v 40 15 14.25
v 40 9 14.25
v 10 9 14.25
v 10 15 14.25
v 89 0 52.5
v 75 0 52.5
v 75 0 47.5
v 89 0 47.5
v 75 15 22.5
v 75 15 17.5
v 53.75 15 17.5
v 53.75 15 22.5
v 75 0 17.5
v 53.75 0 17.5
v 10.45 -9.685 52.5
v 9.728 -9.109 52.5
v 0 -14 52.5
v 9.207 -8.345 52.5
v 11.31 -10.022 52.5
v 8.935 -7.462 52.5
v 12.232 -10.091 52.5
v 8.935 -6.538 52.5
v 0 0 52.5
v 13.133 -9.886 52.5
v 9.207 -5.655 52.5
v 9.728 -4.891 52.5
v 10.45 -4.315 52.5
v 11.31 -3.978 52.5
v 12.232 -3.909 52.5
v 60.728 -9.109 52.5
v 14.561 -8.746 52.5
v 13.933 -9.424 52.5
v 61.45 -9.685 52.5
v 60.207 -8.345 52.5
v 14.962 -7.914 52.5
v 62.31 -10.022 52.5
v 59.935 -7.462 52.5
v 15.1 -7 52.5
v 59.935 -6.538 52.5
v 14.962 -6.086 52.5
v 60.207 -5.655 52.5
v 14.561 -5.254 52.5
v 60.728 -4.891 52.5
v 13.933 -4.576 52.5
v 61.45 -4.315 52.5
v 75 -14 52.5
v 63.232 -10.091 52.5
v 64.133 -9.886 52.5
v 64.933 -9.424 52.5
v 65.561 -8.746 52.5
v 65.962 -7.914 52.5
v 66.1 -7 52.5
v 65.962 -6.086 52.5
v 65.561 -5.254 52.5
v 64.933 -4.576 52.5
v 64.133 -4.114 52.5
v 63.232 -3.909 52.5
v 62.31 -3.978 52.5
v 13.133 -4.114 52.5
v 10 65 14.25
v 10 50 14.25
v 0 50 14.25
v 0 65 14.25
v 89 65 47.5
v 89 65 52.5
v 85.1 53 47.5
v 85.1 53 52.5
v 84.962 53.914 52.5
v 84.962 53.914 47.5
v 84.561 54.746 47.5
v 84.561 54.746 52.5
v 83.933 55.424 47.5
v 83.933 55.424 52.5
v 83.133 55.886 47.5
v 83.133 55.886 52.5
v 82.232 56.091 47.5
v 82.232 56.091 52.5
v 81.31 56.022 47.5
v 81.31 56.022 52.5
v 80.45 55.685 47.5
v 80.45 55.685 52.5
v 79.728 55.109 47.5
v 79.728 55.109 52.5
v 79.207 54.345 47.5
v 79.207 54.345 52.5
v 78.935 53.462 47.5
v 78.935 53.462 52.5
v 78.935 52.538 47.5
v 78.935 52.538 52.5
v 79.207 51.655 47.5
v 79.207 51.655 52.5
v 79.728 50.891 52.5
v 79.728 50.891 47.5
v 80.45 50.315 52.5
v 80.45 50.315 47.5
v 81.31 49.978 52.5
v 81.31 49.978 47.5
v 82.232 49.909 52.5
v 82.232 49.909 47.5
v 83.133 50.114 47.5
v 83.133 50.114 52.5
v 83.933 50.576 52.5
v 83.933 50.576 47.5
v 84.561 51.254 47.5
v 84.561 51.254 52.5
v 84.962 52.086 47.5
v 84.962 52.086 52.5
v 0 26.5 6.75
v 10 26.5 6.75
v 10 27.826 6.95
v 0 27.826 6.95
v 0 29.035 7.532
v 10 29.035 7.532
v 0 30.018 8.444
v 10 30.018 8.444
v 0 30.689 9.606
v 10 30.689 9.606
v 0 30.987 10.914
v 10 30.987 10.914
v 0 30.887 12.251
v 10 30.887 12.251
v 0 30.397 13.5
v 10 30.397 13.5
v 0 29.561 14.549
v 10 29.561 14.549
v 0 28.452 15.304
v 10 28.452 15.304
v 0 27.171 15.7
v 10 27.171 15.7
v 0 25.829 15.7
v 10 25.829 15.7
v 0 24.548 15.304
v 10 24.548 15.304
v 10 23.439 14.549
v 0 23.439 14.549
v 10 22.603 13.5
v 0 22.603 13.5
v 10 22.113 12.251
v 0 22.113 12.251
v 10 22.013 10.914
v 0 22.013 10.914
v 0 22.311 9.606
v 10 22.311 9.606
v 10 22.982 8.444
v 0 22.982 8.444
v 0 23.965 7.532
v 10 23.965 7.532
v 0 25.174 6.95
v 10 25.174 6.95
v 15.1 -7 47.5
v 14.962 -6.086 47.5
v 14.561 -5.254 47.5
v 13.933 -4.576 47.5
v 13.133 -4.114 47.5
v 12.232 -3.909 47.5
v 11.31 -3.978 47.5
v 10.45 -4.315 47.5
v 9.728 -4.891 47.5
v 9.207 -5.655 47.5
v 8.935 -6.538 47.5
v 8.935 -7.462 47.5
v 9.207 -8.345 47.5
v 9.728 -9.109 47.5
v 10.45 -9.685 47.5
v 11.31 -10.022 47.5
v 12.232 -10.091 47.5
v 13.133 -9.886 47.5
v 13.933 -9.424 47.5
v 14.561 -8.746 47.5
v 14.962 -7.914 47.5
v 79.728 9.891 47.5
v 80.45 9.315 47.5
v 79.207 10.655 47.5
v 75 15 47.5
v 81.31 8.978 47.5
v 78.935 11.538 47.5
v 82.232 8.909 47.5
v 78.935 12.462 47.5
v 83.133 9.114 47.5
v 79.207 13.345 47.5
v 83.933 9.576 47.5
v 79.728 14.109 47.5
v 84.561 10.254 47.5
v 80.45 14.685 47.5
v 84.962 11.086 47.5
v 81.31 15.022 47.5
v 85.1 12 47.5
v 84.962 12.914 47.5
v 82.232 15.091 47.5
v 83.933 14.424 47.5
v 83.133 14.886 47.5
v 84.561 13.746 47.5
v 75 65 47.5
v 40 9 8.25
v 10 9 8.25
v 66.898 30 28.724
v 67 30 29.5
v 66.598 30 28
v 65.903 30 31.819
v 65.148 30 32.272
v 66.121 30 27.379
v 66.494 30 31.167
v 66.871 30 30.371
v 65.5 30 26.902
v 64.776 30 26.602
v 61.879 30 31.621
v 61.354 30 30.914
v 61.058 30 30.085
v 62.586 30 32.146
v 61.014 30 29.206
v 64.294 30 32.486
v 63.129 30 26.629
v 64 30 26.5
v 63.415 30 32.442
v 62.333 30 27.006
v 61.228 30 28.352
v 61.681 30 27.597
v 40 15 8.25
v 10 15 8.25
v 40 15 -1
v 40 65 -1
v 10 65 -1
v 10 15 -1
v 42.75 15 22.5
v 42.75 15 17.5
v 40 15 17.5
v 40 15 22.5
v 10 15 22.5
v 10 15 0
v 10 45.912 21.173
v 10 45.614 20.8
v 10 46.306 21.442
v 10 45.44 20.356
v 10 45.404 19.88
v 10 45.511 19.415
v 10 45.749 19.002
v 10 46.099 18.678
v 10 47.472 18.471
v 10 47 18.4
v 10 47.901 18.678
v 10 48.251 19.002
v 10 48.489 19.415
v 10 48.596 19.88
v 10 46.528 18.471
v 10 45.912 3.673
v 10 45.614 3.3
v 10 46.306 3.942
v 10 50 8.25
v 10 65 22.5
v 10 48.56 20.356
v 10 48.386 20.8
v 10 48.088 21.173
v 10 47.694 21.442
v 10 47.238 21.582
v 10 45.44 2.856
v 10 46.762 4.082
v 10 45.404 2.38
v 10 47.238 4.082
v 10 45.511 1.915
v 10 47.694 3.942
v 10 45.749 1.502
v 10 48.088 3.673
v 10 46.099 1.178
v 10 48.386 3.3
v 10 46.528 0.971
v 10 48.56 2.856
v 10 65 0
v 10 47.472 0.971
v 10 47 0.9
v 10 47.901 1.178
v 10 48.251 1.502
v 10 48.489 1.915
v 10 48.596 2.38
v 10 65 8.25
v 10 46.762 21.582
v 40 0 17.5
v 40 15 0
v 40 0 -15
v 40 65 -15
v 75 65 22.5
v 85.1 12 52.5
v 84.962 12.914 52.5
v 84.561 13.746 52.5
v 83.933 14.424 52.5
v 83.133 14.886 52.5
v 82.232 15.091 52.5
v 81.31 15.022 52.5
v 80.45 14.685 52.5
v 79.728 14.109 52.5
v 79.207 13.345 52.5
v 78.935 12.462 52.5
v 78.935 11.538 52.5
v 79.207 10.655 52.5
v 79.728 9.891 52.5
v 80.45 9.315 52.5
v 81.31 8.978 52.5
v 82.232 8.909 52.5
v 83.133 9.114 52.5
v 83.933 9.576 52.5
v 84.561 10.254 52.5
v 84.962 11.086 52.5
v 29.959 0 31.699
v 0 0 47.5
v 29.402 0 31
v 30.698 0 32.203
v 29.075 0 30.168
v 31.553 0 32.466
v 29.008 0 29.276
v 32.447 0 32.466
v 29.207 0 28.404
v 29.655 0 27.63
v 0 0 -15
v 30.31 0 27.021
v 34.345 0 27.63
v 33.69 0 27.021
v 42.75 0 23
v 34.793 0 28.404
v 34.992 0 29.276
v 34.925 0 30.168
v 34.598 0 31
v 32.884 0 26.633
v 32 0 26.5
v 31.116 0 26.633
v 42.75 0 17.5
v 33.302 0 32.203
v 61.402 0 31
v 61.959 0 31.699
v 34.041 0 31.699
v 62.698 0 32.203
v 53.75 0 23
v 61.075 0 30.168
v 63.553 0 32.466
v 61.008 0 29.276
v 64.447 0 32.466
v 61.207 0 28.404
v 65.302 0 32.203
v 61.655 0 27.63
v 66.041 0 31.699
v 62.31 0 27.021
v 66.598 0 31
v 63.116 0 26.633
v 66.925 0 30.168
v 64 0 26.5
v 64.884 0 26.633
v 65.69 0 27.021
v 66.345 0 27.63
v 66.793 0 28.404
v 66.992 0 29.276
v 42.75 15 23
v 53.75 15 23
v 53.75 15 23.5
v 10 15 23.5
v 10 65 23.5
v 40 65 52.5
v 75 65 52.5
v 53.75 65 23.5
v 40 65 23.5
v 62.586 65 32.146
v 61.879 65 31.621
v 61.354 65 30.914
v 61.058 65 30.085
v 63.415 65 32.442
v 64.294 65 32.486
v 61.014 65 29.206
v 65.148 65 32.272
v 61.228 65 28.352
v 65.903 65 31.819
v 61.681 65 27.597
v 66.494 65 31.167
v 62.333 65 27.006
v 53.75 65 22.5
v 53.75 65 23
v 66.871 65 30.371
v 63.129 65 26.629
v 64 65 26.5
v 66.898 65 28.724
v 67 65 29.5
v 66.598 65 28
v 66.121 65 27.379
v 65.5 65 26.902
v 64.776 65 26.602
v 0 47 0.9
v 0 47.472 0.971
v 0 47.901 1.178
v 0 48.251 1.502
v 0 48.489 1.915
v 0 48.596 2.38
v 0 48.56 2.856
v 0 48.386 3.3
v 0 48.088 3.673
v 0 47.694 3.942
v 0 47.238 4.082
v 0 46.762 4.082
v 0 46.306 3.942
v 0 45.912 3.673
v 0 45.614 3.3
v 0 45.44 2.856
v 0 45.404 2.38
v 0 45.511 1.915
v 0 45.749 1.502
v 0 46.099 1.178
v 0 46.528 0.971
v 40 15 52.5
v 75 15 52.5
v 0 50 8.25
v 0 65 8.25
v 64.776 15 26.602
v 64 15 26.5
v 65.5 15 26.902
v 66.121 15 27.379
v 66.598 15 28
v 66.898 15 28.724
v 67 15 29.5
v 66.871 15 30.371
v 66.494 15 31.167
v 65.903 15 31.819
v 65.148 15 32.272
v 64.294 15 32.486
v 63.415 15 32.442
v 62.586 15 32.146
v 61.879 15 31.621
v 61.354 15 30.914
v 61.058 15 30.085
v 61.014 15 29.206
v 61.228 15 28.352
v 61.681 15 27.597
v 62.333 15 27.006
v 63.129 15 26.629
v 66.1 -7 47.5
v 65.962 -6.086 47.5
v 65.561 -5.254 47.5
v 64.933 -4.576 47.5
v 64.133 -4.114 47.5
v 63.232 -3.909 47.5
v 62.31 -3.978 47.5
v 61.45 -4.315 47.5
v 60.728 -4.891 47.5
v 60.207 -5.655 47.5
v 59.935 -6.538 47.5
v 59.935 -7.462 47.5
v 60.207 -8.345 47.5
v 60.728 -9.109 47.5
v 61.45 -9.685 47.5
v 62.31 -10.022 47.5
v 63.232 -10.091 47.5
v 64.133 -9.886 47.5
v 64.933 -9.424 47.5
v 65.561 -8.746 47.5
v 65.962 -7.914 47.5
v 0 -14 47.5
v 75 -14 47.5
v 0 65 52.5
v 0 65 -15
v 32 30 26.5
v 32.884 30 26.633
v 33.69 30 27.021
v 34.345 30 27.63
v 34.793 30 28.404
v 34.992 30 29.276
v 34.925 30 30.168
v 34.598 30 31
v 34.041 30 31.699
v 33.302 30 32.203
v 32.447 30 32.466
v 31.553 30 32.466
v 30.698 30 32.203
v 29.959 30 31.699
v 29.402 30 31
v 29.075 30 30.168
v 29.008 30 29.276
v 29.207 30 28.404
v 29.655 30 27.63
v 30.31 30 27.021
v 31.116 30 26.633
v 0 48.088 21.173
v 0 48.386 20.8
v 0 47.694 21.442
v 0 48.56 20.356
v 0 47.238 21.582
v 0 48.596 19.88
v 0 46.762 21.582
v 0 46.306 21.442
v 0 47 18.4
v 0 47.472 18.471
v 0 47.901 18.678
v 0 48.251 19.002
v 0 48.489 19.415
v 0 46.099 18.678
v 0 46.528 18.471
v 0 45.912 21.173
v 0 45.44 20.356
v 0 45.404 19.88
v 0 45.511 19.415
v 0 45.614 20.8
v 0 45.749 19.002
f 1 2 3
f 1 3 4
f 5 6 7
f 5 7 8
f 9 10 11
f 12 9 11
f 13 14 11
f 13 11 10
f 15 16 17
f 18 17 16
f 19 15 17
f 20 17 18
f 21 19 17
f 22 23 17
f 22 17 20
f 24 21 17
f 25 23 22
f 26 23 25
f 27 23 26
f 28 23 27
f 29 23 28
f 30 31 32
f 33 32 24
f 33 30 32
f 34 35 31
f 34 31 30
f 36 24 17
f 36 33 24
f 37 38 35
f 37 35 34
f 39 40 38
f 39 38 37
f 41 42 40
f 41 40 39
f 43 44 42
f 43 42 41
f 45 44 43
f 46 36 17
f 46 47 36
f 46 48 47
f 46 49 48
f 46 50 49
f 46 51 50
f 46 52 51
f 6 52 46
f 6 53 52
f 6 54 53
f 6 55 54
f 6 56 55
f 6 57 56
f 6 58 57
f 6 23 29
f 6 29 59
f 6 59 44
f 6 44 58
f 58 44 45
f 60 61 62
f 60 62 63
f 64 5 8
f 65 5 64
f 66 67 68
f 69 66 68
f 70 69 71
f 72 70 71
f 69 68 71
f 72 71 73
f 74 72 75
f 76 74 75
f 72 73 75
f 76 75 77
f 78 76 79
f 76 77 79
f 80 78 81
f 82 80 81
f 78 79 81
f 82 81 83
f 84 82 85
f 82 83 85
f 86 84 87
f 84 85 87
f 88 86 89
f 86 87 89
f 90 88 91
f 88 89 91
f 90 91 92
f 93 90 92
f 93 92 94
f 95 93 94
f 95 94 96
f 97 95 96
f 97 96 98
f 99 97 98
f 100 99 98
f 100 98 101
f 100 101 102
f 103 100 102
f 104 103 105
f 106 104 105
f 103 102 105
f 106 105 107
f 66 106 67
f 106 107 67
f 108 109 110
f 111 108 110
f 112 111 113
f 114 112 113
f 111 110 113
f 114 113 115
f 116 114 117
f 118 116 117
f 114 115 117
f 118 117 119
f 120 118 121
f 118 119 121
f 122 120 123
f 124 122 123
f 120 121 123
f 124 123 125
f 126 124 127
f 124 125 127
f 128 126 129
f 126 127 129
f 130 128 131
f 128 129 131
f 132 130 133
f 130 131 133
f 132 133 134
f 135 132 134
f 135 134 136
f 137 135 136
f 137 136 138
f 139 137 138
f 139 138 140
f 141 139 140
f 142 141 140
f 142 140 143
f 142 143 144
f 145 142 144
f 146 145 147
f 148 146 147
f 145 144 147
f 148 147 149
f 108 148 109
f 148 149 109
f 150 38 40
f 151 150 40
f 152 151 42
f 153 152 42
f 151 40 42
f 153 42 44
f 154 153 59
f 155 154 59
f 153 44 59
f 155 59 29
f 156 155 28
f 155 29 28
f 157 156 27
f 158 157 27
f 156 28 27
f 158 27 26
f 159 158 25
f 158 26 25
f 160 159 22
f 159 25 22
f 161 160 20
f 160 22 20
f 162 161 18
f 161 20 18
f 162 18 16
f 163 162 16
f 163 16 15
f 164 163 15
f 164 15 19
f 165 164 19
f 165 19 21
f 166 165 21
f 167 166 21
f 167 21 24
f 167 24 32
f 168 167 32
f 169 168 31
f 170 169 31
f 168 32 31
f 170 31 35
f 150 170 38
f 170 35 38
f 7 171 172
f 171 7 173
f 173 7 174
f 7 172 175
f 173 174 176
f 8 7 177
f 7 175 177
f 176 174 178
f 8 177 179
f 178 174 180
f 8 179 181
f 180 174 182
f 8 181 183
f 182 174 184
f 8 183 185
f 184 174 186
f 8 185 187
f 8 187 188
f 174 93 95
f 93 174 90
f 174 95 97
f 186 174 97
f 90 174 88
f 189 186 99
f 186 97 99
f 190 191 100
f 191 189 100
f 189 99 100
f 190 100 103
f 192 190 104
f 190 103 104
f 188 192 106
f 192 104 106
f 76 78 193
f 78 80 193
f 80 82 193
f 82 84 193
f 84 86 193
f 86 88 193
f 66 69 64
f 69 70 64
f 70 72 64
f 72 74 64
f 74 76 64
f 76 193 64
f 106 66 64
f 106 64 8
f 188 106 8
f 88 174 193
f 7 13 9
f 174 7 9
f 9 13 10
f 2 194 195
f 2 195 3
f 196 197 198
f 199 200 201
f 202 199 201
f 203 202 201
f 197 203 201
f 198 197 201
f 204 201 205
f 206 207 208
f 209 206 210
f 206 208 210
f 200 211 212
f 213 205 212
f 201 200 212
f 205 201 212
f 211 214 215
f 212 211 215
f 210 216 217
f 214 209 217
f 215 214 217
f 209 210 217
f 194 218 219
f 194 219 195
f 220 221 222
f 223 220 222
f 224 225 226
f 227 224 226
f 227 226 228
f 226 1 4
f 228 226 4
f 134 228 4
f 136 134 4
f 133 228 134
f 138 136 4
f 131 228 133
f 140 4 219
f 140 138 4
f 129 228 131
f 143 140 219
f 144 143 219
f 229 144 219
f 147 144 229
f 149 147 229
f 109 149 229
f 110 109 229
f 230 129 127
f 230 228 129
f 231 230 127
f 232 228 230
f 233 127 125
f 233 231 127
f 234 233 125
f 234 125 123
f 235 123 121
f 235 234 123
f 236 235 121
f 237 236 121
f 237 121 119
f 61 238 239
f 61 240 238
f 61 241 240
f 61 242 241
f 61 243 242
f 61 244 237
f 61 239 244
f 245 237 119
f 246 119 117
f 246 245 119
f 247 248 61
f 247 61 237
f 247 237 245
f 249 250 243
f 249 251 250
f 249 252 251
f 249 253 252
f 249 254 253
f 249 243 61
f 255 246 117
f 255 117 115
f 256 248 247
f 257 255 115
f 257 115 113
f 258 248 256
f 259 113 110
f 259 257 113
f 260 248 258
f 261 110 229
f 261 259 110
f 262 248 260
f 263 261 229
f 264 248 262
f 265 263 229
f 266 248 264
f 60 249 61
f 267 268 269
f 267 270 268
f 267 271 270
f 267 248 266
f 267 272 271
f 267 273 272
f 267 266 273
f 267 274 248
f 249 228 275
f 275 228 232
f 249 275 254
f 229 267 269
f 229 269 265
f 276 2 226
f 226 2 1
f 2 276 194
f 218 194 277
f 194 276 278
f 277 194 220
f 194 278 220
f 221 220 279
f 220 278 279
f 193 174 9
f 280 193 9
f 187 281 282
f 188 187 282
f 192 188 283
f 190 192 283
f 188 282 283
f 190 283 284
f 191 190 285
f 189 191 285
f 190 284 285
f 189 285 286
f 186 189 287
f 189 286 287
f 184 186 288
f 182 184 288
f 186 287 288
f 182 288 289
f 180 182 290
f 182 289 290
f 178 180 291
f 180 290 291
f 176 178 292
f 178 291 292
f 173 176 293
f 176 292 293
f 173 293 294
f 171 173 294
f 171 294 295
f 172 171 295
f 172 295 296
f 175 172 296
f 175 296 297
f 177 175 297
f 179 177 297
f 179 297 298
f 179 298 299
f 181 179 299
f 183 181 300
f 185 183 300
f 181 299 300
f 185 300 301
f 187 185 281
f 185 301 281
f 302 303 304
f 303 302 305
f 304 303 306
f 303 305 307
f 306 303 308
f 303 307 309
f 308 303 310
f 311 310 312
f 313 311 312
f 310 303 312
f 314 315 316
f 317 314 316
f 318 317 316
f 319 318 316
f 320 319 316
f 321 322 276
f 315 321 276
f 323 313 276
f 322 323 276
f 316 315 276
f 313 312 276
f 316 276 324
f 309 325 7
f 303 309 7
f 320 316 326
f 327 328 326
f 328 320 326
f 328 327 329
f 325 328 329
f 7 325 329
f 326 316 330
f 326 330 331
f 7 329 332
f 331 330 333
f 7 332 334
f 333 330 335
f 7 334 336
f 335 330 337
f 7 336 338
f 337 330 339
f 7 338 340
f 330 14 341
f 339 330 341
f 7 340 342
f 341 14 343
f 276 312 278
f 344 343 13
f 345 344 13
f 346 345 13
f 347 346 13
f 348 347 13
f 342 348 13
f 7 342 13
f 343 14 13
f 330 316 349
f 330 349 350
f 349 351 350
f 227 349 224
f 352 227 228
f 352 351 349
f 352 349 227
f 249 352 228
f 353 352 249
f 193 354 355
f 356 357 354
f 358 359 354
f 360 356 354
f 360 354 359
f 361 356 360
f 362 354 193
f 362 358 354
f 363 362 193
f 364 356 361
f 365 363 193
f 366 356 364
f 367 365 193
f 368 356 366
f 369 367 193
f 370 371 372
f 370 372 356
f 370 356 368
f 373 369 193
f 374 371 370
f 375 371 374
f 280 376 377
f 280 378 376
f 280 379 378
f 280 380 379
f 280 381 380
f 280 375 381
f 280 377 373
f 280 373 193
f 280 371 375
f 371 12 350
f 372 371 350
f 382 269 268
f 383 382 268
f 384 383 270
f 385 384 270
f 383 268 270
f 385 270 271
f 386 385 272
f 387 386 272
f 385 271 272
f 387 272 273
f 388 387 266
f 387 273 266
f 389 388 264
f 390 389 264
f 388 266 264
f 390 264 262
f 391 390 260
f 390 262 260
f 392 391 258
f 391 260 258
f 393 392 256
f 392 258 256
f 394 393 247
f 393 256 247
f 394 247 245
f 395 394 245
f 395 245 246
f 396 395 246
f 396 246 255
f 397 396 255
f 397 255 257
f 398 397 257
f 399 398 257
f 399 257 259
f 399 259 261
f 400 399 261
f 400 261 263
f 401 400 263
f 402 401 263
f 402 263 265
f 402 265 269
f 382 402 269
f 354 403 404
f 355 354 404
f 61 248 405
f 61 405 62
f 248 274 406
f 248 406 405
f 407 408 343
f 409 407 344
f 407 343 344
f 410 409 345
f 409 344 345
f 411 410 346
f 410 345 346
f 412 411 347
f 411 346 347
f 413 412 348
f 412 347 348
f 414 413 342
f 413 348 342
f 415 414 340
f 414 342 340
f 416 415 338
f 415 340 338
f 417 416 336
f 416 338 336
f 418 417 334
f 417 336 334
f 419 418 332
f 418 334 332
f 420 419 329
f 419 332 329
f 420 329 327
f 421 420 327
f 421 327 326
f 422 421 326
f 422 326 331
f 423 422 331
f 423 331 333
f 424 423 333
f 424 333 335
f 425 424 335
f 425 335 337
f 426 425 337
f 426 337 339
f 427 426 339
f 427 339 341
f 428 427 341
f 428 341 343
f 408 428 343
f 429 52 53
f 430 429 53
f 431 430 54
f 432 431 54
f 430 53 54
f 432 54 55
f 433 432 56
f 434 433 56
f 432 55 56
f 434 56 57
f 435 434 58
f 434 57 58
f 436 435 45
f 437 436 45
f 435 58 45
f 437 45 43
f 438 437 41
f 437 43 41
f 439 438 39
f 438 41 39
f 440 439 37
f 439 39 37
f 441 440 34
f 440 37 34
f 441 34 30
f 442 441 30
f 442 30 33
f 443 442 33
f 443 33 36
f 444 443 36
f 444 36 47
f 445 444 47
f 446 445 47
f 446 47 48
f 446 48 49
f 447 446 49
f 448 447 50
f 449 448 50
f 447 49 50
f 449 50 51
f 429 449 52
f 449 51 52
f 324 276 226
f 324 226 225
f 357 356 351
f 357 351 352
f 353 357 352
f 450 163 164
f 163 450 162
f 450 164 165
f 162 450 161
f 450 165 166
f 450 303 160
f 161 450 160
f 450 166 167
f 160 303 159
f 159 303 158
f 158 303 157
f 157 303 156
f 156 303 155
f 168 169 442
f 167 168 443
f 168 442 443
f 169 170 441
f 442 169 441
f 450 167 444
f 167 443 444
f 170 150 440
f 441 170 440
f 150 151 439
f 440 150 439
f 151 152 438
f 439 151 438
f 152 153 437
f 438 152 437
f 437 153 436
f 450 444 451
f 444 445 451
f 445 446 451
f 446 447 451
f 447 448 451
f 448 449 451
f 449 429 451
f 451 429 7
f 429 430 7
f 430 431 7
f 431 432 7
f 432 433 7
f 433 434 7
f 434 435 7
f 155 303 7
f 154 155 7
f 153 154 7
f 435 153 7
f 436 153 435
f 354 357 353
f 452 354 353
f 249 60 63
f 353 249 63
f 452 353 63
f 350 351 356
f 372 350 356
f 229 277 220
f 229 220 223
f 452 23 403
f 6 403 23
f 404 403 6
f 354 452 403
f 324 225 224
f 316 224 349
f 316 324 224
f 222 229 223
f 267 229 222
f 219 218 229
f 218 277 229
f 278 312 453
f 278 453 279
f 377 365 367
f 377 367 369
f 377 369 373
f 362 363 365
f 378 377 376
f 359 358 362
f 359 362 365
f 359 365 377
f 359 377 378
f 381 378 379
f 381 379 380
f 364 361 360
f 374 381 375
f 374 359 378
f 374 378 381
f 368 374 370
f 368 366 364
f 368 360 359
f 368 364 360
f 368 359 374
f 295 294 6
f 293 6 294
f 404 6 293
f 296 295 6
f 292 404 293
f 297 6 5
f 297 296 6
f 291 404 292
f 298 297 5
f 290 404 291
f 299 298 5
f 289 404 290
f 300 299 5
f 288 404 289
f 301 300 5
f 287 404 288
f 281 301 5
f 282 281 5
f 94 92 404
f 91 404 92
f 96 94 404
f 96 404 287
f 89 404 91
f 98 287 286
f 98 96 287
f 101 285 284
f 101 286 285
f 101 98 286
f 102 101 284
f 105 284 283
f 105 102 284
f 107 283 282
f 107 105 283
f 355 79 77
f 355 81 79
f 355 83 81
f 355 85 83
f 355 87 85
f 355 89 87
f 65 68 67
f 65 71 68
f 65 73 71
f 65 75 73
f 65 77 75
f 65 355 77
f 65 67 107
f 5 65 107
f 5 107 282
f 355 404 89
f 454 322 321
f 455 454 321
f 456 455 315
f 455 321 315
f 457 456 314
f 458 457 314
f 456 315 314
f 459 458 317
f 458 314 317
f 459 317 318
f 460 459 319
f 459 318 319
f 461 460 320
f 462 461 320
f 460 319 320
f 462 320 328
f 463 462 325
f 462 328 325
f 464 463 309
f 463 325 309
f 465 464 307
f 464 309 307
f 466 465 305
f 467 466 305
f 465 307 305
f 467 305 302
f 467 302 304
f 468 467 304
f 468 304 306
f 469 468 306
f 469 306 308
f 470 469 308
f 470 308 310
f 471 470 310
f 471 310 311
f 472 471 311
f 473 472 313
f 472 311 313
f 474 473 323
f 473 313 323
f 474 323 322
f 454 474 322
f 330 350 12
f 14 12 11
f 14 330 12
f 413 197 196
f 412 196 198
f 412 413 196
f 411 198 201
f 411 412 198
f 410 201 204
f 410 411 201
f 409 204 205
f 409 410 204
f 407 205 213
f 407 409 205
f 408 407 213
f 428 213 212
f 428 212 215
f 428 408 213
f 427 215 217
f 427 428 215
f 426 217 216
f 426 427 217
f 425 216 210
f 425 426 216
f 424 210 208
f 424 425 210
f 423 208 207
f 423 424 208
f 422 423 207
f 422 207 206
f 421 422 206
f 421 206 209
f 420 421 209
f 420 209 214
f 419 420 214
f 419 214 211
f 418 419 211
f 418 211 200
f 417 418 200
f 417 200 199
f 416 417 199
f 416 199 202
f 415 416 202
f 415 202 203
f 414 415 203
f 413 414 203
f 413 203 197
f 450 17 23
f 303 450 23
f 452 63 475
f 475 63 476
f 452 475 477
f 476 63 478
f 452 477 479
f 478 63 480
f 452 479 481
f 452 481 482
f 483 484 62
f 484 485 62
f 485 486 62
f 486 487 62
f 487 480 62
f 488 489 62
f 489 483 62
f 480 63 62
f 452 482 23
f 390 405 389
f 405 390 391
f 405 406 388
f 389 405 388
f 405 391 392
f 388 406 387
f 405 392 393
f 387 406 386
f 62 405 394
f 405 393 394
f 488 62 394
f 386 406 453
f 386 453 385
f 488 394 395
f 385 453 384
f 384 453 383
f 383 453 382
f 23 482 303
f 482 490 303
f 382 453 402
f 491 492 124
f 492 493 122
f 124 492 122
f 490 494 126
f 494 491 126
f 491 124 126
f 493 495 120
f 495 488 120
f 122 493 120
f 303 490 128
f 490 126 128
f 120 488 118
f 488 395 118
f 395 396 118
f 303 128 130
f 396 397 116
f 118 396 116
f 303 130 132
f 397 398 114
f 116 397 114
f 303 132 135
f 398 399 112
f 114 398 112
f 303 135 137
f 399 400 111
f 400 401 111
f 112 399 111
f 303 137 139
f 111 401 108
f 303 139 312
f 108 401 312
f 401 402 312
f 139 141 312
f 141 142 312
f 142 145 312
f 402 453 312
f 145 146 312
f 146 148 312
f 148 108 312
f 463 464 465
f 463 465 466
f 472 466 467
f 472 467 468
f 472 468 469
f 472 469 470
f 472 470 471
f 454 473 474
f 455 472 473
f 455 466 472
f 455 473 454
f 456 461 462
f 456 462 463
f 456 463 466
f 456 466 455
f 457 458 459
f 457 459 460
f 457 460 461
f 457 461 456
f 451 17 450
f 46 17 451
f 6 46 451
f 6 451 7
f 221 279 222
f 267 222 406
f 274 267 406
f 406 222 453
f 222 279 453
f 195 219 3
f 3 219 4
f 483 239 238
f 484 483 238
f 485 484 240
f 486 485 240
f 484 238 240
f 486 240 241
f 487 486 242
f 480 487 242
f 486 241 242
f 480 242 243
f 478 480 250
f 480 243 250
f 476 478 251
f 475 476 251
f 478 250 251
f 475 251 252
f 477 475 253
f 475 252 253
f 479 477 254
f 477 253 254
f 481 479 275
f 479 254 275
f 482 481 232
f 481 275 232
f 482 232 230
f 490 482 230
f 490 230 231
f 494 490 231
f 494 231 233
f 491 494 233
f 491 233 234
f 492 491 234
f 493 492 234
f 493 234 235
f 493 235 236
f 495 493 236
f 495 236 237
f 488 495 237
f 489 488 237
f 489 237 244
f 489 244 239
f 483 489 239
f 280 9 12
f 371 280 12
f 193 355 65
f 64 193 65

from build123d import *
from build123d.topology import SkipClean

# Parameters (mm, degrees)
BOSS_EXTRUDE1_DEPTH      = 42.5
BOSS_EXTRUDE1_DEPTH_BACK = 15
SKETCH1_W                = 40
SKETCH1_H                = 65
SKETCH3_W                = 22.5
SKETCH3_H                = 50
CUT_EXTRUDE2_DEPTH       = 30
SKETCH4_R                = 4.5
CUT_EXTRUDE3_DEPTH       = 10
SKETCH5_W                = 35
SKETCH5_H                = 25
BOSS_EXTRUDE3_DEPTH      = 15
SKETCH6_R                = 3
CUT_EXTRUDE4_DEPTH       = 30
CUT_EXTRUDE5_DEPTH       = 108.964114408
BOSS_EXTRUDE4_DEPTH      = 10
BOSS_EXTRUDE5_OUTLINE_R  = 3
BOSS_EXTRUDE5_DEPTH      = 50
BOSS_EXTRUDE6_START      = -35
SKETCH11_R               = 3
BOSS_EXTRUDE6_DEPTH      = 35
SKETCH12_W               = 14
SKETCH12_H               = 65
SKETCH12_R               = 3.1
SKETCH12_W_2             = 75
SKETCH12_H_2             = 14
BOSS_EXTRUDE7_DEPTH      = 5
SKETCH13_R               = 1.6
CUT_EXTRUDE6_DEPTH       = 115.988042857
CUT_EXTRUDE7_DEPTH       = 12.25
CUT_EXTRUDE7_DEPTH_BACK  = 12.25
SKETCH14_W               = 43.75
SKETCH14_H               = 50
CUT_EXTRUDE8_DEPTH       = 30
CUT_EXTRUDE9_DEPTH       = 115.988042857


# Read off the part's stored shape, not the designer's step: Boss-Extrude5
with BuildPart() as part:
    # Sketch1 → Boss-Extrude1 (new, two sides: drawn at the far end of the back side and taken through both)
    with BuildSketch(Plane.XY.offset(-BOSS_EXTRUDE1_DEPTH_BACK)):
        with Locations((20, 32.5)):
            Rectangle(SKETCH1_W, SKETCH1_H)
    extrude(amount=BOSS_EXTRUDE1_DEPTH + BOSS_EXTRUDE1_DEPTH_BACK)

    # Sketch3 → Cut-Extrude2 (cut)
    with BuildSketch(Plane(origin=(40, 0, 0), x_dir=(0, 0, -1), z_dir=(1, 0, 0))):
        with Locations((-11.25, 40)):
            Rectangle(SKETCH3_W, SKETCH3_H)
    extrude(amount=-CUT_EXTRUDE2_DEPTH, mode=Mode.SUBTRACT)

    # Sketch4 → Cut-Extrude3 (cut)
    with BuildSketch(Plane(origin=(10, 0, 0), x_dir=(0, 0, -1), z_dir=(1, 0, 0))):
        with Locations((-11.25, 26.5)):
            Circle(SKETCH4_R)
    extrude(amount=-CUT_EXTRUDE3_DEPTH, mode=Mode.SUBTRACT)

    # Sketch5 → Boss-Extrude3 (add)
    with BuildSketch(Plane.XZ):
        with Locations((57.5, 30)):
            Rectangle(SKETCH5_W, SKETCH5_H)
    extrude(amount=-BOSS_EXTRUDE3_DEPTH)

    # Sketch6 → Cut-Extrude4 (cut)
    with BuildSketch(Plane.XZ):
        with Locations(Location((32, 29.5, 0), (0, 0, 270))):
            Circle(SKETCH6_R)
        with Locations(Location((64, 29.5, 0), (0, 0, 270))):
            Circle(SKETCH6_R)
    extrude(amount=-CUT_EXTRUDE4_DEPTH, mode=Mode.SUBTRACT)

    # Sketch8 → Cut-Extrude5 (cut, through all)
    with BuildSketch(Plane.XZ):
        Polygon((48.25, 17.5), (42.75, 17.5), (42.75, 23), (53.75, 23), (53.75, 17.5), align=None)
    extrude(amount=-CUT_EXTRUDE5_DEPTH, mode=Mode.SUBTRACT)

    # Sketch9 → Boss-Extrude4 (add)
    with BuildSketch(Plane.XY.offset(42.5)):
        Polygon((0, 65), (0, 0), (75, 0), (75, 15), (40, 15), (40, 65), align=None)
    extrude(amount=BOSS_EXTRUDE4_DEPTH)

    # Boss-Extrude5 outline → Boss-Extrude5 (add)
    with SkipClean():  # the faces are left unmerged after this step: merging them gives an invalid solid
        with BuildSketch(Plane(origin=(0, 15, 0), x_dir=(1, 0, 0), z_dir=(0, 1, 0))):
            Polygon((75, -52.5), (75, -22.5), (53.75, -22.5), (53.75, -23), (42.75, -23), (42.75, -22.5), (40, -22.5), (40, -52.5), align=None)
            with Locations((64, -29.5)):
                Circle(BOSS_EXTRUDE5_OUTLINE_R, mode=Mode.SUBTRACT)
        extrude(amount=BOSS_EXTRUDE5_DEPTH)

    # Sketch11 → Boss-Extrude6 (add)
    with SkipClean():  # the faces are left unmerged after this step: merging them gives an invalid solid
        with BuildSketch(Plane(origin=(0, 65, 0), x_dir=(1, 0, 0), z_dir=(0, 1, 0)).offset(BOSS_EXTRUDE6_START)):
            with Locations(Location((64, -29.5, 0), (0, 0, 90))):
                Circle(SKETCH11_R)
        extrude(amount=BOSS_EXTRUDE6_DEPTH)

    # Sketch12 → Boss-Extrude7 (add)
    # profile 1 of 2: a face of its own
    with SkipClean():  # the faces are left unmerged after this step: merging them gives an invalid solid
        with BuildSketch(Plane.XY.offset(52.5)):
            with Locations((82, 32.5)):
                Rectangle(SKETCH12_W, SKETCH12_H)
            with Locations((82, 53)):
                Circle(SKETCH12_R, mode=Mode.SUBTRACT)
            with Locations((82, 12)):
                Circle(SKETCH12_R, mode=Mode.SUBTRACT)
        # profile 2 of 2: a face of its own
        with BuildSketch(Plane.XY.offset(52.5)):
            with Locations((37.5, -7)):
                Rectangle(SKETCH12_W_2, SKETCH12_H_2)
            with Locations((12, -7)):
                Circle(SKETCH12_R, mode=Mode.SUBTRACT)
            with Locations((63, -7)):
                Circle(SKETCH12_R, mode=Mode.SUBTRACT)
        extrude(amount=-BOSS_EXTRUDE7_DEPTH)

    # Sketch13 → Cut-Extrude6 (cut, through all)
    with SkipClean():  # the faces are left unmerged after this step: merging them gives an invalid solid
        with BuildSketch(Plane(origin=(10, 0, 0), x_dir=(0, 0, -1), z_dir=(1, 0, 0))):
            with Locations((-2.5, 47)):
                Circle(SKETCH13_R)
            with Locations((-20, 47)):
                Circle(SKETCH13_R)
        extrude(amount=-CUT_EXTRUDE6_DEPTH, mode=Mode.SUBTRACT)

    # Sketch14 → Cut-Extrude7 (cut, two sides: drawn at the far end of the back side and taken through both)
    with SkipClean():  # the faces are left unmerged after this step: merging them gives an invalid solid
        with BuildSketch(Plane(origin=(0, 0, 11.25), x_dir=(-1, 0, 0), z_dir=(0, 0, -1)).offset(-CUT_EXTRUDE7_DEPTH_BACK)):
            with Locations((-31.875, 40)):
                Rectangle(SKETCH14_W, SKETCH14_H)
        extrude(amount=CUT_EXTRUDE7_DEPTH + CUT_EXTRUDE7_DEPTH_BACK, mode=Mode.SUBTRACT)

    # Sketch15 → Cut-Extrude8 (cut)
    with SkipClean():  # the faces are left unmerged after this step: merging them gives an invalid solid
        with BuildSketch(Plane(origin=(40, 0, 0), x_dir=(0, 0, -1), z_dir=(1, 0, 0))):
            Polygon((-11.25, 15), (-8.25, 15), (-8.25, 9), (-14.25, 9), (-14.25, 15), align=None)
        extrude(amount=-CUT_EXTRUDE8_DEPTH, mode=Mode.SUBTRACT)

    # Sketch16 → Cut-Extrude9 (cut, through all)
    with SkipClean():  # the faces are left unmerged after this step: merging them gives an invalid solid
        with BuildSketch(Plane(origin=(10, 0, 0), x_dir=(0, 0, -1), z_dir=(1, 0, 0))):
            Polygon((-11.25, 65), (-8.25, 65), (-8.25, 50), (-14.25, 50), (-14.25, 65), align=None)
        extrude(amount=-CUT_EXTRUDE9_DEPTH, mode=Mode.SUBTRACT)


solid = part.part
